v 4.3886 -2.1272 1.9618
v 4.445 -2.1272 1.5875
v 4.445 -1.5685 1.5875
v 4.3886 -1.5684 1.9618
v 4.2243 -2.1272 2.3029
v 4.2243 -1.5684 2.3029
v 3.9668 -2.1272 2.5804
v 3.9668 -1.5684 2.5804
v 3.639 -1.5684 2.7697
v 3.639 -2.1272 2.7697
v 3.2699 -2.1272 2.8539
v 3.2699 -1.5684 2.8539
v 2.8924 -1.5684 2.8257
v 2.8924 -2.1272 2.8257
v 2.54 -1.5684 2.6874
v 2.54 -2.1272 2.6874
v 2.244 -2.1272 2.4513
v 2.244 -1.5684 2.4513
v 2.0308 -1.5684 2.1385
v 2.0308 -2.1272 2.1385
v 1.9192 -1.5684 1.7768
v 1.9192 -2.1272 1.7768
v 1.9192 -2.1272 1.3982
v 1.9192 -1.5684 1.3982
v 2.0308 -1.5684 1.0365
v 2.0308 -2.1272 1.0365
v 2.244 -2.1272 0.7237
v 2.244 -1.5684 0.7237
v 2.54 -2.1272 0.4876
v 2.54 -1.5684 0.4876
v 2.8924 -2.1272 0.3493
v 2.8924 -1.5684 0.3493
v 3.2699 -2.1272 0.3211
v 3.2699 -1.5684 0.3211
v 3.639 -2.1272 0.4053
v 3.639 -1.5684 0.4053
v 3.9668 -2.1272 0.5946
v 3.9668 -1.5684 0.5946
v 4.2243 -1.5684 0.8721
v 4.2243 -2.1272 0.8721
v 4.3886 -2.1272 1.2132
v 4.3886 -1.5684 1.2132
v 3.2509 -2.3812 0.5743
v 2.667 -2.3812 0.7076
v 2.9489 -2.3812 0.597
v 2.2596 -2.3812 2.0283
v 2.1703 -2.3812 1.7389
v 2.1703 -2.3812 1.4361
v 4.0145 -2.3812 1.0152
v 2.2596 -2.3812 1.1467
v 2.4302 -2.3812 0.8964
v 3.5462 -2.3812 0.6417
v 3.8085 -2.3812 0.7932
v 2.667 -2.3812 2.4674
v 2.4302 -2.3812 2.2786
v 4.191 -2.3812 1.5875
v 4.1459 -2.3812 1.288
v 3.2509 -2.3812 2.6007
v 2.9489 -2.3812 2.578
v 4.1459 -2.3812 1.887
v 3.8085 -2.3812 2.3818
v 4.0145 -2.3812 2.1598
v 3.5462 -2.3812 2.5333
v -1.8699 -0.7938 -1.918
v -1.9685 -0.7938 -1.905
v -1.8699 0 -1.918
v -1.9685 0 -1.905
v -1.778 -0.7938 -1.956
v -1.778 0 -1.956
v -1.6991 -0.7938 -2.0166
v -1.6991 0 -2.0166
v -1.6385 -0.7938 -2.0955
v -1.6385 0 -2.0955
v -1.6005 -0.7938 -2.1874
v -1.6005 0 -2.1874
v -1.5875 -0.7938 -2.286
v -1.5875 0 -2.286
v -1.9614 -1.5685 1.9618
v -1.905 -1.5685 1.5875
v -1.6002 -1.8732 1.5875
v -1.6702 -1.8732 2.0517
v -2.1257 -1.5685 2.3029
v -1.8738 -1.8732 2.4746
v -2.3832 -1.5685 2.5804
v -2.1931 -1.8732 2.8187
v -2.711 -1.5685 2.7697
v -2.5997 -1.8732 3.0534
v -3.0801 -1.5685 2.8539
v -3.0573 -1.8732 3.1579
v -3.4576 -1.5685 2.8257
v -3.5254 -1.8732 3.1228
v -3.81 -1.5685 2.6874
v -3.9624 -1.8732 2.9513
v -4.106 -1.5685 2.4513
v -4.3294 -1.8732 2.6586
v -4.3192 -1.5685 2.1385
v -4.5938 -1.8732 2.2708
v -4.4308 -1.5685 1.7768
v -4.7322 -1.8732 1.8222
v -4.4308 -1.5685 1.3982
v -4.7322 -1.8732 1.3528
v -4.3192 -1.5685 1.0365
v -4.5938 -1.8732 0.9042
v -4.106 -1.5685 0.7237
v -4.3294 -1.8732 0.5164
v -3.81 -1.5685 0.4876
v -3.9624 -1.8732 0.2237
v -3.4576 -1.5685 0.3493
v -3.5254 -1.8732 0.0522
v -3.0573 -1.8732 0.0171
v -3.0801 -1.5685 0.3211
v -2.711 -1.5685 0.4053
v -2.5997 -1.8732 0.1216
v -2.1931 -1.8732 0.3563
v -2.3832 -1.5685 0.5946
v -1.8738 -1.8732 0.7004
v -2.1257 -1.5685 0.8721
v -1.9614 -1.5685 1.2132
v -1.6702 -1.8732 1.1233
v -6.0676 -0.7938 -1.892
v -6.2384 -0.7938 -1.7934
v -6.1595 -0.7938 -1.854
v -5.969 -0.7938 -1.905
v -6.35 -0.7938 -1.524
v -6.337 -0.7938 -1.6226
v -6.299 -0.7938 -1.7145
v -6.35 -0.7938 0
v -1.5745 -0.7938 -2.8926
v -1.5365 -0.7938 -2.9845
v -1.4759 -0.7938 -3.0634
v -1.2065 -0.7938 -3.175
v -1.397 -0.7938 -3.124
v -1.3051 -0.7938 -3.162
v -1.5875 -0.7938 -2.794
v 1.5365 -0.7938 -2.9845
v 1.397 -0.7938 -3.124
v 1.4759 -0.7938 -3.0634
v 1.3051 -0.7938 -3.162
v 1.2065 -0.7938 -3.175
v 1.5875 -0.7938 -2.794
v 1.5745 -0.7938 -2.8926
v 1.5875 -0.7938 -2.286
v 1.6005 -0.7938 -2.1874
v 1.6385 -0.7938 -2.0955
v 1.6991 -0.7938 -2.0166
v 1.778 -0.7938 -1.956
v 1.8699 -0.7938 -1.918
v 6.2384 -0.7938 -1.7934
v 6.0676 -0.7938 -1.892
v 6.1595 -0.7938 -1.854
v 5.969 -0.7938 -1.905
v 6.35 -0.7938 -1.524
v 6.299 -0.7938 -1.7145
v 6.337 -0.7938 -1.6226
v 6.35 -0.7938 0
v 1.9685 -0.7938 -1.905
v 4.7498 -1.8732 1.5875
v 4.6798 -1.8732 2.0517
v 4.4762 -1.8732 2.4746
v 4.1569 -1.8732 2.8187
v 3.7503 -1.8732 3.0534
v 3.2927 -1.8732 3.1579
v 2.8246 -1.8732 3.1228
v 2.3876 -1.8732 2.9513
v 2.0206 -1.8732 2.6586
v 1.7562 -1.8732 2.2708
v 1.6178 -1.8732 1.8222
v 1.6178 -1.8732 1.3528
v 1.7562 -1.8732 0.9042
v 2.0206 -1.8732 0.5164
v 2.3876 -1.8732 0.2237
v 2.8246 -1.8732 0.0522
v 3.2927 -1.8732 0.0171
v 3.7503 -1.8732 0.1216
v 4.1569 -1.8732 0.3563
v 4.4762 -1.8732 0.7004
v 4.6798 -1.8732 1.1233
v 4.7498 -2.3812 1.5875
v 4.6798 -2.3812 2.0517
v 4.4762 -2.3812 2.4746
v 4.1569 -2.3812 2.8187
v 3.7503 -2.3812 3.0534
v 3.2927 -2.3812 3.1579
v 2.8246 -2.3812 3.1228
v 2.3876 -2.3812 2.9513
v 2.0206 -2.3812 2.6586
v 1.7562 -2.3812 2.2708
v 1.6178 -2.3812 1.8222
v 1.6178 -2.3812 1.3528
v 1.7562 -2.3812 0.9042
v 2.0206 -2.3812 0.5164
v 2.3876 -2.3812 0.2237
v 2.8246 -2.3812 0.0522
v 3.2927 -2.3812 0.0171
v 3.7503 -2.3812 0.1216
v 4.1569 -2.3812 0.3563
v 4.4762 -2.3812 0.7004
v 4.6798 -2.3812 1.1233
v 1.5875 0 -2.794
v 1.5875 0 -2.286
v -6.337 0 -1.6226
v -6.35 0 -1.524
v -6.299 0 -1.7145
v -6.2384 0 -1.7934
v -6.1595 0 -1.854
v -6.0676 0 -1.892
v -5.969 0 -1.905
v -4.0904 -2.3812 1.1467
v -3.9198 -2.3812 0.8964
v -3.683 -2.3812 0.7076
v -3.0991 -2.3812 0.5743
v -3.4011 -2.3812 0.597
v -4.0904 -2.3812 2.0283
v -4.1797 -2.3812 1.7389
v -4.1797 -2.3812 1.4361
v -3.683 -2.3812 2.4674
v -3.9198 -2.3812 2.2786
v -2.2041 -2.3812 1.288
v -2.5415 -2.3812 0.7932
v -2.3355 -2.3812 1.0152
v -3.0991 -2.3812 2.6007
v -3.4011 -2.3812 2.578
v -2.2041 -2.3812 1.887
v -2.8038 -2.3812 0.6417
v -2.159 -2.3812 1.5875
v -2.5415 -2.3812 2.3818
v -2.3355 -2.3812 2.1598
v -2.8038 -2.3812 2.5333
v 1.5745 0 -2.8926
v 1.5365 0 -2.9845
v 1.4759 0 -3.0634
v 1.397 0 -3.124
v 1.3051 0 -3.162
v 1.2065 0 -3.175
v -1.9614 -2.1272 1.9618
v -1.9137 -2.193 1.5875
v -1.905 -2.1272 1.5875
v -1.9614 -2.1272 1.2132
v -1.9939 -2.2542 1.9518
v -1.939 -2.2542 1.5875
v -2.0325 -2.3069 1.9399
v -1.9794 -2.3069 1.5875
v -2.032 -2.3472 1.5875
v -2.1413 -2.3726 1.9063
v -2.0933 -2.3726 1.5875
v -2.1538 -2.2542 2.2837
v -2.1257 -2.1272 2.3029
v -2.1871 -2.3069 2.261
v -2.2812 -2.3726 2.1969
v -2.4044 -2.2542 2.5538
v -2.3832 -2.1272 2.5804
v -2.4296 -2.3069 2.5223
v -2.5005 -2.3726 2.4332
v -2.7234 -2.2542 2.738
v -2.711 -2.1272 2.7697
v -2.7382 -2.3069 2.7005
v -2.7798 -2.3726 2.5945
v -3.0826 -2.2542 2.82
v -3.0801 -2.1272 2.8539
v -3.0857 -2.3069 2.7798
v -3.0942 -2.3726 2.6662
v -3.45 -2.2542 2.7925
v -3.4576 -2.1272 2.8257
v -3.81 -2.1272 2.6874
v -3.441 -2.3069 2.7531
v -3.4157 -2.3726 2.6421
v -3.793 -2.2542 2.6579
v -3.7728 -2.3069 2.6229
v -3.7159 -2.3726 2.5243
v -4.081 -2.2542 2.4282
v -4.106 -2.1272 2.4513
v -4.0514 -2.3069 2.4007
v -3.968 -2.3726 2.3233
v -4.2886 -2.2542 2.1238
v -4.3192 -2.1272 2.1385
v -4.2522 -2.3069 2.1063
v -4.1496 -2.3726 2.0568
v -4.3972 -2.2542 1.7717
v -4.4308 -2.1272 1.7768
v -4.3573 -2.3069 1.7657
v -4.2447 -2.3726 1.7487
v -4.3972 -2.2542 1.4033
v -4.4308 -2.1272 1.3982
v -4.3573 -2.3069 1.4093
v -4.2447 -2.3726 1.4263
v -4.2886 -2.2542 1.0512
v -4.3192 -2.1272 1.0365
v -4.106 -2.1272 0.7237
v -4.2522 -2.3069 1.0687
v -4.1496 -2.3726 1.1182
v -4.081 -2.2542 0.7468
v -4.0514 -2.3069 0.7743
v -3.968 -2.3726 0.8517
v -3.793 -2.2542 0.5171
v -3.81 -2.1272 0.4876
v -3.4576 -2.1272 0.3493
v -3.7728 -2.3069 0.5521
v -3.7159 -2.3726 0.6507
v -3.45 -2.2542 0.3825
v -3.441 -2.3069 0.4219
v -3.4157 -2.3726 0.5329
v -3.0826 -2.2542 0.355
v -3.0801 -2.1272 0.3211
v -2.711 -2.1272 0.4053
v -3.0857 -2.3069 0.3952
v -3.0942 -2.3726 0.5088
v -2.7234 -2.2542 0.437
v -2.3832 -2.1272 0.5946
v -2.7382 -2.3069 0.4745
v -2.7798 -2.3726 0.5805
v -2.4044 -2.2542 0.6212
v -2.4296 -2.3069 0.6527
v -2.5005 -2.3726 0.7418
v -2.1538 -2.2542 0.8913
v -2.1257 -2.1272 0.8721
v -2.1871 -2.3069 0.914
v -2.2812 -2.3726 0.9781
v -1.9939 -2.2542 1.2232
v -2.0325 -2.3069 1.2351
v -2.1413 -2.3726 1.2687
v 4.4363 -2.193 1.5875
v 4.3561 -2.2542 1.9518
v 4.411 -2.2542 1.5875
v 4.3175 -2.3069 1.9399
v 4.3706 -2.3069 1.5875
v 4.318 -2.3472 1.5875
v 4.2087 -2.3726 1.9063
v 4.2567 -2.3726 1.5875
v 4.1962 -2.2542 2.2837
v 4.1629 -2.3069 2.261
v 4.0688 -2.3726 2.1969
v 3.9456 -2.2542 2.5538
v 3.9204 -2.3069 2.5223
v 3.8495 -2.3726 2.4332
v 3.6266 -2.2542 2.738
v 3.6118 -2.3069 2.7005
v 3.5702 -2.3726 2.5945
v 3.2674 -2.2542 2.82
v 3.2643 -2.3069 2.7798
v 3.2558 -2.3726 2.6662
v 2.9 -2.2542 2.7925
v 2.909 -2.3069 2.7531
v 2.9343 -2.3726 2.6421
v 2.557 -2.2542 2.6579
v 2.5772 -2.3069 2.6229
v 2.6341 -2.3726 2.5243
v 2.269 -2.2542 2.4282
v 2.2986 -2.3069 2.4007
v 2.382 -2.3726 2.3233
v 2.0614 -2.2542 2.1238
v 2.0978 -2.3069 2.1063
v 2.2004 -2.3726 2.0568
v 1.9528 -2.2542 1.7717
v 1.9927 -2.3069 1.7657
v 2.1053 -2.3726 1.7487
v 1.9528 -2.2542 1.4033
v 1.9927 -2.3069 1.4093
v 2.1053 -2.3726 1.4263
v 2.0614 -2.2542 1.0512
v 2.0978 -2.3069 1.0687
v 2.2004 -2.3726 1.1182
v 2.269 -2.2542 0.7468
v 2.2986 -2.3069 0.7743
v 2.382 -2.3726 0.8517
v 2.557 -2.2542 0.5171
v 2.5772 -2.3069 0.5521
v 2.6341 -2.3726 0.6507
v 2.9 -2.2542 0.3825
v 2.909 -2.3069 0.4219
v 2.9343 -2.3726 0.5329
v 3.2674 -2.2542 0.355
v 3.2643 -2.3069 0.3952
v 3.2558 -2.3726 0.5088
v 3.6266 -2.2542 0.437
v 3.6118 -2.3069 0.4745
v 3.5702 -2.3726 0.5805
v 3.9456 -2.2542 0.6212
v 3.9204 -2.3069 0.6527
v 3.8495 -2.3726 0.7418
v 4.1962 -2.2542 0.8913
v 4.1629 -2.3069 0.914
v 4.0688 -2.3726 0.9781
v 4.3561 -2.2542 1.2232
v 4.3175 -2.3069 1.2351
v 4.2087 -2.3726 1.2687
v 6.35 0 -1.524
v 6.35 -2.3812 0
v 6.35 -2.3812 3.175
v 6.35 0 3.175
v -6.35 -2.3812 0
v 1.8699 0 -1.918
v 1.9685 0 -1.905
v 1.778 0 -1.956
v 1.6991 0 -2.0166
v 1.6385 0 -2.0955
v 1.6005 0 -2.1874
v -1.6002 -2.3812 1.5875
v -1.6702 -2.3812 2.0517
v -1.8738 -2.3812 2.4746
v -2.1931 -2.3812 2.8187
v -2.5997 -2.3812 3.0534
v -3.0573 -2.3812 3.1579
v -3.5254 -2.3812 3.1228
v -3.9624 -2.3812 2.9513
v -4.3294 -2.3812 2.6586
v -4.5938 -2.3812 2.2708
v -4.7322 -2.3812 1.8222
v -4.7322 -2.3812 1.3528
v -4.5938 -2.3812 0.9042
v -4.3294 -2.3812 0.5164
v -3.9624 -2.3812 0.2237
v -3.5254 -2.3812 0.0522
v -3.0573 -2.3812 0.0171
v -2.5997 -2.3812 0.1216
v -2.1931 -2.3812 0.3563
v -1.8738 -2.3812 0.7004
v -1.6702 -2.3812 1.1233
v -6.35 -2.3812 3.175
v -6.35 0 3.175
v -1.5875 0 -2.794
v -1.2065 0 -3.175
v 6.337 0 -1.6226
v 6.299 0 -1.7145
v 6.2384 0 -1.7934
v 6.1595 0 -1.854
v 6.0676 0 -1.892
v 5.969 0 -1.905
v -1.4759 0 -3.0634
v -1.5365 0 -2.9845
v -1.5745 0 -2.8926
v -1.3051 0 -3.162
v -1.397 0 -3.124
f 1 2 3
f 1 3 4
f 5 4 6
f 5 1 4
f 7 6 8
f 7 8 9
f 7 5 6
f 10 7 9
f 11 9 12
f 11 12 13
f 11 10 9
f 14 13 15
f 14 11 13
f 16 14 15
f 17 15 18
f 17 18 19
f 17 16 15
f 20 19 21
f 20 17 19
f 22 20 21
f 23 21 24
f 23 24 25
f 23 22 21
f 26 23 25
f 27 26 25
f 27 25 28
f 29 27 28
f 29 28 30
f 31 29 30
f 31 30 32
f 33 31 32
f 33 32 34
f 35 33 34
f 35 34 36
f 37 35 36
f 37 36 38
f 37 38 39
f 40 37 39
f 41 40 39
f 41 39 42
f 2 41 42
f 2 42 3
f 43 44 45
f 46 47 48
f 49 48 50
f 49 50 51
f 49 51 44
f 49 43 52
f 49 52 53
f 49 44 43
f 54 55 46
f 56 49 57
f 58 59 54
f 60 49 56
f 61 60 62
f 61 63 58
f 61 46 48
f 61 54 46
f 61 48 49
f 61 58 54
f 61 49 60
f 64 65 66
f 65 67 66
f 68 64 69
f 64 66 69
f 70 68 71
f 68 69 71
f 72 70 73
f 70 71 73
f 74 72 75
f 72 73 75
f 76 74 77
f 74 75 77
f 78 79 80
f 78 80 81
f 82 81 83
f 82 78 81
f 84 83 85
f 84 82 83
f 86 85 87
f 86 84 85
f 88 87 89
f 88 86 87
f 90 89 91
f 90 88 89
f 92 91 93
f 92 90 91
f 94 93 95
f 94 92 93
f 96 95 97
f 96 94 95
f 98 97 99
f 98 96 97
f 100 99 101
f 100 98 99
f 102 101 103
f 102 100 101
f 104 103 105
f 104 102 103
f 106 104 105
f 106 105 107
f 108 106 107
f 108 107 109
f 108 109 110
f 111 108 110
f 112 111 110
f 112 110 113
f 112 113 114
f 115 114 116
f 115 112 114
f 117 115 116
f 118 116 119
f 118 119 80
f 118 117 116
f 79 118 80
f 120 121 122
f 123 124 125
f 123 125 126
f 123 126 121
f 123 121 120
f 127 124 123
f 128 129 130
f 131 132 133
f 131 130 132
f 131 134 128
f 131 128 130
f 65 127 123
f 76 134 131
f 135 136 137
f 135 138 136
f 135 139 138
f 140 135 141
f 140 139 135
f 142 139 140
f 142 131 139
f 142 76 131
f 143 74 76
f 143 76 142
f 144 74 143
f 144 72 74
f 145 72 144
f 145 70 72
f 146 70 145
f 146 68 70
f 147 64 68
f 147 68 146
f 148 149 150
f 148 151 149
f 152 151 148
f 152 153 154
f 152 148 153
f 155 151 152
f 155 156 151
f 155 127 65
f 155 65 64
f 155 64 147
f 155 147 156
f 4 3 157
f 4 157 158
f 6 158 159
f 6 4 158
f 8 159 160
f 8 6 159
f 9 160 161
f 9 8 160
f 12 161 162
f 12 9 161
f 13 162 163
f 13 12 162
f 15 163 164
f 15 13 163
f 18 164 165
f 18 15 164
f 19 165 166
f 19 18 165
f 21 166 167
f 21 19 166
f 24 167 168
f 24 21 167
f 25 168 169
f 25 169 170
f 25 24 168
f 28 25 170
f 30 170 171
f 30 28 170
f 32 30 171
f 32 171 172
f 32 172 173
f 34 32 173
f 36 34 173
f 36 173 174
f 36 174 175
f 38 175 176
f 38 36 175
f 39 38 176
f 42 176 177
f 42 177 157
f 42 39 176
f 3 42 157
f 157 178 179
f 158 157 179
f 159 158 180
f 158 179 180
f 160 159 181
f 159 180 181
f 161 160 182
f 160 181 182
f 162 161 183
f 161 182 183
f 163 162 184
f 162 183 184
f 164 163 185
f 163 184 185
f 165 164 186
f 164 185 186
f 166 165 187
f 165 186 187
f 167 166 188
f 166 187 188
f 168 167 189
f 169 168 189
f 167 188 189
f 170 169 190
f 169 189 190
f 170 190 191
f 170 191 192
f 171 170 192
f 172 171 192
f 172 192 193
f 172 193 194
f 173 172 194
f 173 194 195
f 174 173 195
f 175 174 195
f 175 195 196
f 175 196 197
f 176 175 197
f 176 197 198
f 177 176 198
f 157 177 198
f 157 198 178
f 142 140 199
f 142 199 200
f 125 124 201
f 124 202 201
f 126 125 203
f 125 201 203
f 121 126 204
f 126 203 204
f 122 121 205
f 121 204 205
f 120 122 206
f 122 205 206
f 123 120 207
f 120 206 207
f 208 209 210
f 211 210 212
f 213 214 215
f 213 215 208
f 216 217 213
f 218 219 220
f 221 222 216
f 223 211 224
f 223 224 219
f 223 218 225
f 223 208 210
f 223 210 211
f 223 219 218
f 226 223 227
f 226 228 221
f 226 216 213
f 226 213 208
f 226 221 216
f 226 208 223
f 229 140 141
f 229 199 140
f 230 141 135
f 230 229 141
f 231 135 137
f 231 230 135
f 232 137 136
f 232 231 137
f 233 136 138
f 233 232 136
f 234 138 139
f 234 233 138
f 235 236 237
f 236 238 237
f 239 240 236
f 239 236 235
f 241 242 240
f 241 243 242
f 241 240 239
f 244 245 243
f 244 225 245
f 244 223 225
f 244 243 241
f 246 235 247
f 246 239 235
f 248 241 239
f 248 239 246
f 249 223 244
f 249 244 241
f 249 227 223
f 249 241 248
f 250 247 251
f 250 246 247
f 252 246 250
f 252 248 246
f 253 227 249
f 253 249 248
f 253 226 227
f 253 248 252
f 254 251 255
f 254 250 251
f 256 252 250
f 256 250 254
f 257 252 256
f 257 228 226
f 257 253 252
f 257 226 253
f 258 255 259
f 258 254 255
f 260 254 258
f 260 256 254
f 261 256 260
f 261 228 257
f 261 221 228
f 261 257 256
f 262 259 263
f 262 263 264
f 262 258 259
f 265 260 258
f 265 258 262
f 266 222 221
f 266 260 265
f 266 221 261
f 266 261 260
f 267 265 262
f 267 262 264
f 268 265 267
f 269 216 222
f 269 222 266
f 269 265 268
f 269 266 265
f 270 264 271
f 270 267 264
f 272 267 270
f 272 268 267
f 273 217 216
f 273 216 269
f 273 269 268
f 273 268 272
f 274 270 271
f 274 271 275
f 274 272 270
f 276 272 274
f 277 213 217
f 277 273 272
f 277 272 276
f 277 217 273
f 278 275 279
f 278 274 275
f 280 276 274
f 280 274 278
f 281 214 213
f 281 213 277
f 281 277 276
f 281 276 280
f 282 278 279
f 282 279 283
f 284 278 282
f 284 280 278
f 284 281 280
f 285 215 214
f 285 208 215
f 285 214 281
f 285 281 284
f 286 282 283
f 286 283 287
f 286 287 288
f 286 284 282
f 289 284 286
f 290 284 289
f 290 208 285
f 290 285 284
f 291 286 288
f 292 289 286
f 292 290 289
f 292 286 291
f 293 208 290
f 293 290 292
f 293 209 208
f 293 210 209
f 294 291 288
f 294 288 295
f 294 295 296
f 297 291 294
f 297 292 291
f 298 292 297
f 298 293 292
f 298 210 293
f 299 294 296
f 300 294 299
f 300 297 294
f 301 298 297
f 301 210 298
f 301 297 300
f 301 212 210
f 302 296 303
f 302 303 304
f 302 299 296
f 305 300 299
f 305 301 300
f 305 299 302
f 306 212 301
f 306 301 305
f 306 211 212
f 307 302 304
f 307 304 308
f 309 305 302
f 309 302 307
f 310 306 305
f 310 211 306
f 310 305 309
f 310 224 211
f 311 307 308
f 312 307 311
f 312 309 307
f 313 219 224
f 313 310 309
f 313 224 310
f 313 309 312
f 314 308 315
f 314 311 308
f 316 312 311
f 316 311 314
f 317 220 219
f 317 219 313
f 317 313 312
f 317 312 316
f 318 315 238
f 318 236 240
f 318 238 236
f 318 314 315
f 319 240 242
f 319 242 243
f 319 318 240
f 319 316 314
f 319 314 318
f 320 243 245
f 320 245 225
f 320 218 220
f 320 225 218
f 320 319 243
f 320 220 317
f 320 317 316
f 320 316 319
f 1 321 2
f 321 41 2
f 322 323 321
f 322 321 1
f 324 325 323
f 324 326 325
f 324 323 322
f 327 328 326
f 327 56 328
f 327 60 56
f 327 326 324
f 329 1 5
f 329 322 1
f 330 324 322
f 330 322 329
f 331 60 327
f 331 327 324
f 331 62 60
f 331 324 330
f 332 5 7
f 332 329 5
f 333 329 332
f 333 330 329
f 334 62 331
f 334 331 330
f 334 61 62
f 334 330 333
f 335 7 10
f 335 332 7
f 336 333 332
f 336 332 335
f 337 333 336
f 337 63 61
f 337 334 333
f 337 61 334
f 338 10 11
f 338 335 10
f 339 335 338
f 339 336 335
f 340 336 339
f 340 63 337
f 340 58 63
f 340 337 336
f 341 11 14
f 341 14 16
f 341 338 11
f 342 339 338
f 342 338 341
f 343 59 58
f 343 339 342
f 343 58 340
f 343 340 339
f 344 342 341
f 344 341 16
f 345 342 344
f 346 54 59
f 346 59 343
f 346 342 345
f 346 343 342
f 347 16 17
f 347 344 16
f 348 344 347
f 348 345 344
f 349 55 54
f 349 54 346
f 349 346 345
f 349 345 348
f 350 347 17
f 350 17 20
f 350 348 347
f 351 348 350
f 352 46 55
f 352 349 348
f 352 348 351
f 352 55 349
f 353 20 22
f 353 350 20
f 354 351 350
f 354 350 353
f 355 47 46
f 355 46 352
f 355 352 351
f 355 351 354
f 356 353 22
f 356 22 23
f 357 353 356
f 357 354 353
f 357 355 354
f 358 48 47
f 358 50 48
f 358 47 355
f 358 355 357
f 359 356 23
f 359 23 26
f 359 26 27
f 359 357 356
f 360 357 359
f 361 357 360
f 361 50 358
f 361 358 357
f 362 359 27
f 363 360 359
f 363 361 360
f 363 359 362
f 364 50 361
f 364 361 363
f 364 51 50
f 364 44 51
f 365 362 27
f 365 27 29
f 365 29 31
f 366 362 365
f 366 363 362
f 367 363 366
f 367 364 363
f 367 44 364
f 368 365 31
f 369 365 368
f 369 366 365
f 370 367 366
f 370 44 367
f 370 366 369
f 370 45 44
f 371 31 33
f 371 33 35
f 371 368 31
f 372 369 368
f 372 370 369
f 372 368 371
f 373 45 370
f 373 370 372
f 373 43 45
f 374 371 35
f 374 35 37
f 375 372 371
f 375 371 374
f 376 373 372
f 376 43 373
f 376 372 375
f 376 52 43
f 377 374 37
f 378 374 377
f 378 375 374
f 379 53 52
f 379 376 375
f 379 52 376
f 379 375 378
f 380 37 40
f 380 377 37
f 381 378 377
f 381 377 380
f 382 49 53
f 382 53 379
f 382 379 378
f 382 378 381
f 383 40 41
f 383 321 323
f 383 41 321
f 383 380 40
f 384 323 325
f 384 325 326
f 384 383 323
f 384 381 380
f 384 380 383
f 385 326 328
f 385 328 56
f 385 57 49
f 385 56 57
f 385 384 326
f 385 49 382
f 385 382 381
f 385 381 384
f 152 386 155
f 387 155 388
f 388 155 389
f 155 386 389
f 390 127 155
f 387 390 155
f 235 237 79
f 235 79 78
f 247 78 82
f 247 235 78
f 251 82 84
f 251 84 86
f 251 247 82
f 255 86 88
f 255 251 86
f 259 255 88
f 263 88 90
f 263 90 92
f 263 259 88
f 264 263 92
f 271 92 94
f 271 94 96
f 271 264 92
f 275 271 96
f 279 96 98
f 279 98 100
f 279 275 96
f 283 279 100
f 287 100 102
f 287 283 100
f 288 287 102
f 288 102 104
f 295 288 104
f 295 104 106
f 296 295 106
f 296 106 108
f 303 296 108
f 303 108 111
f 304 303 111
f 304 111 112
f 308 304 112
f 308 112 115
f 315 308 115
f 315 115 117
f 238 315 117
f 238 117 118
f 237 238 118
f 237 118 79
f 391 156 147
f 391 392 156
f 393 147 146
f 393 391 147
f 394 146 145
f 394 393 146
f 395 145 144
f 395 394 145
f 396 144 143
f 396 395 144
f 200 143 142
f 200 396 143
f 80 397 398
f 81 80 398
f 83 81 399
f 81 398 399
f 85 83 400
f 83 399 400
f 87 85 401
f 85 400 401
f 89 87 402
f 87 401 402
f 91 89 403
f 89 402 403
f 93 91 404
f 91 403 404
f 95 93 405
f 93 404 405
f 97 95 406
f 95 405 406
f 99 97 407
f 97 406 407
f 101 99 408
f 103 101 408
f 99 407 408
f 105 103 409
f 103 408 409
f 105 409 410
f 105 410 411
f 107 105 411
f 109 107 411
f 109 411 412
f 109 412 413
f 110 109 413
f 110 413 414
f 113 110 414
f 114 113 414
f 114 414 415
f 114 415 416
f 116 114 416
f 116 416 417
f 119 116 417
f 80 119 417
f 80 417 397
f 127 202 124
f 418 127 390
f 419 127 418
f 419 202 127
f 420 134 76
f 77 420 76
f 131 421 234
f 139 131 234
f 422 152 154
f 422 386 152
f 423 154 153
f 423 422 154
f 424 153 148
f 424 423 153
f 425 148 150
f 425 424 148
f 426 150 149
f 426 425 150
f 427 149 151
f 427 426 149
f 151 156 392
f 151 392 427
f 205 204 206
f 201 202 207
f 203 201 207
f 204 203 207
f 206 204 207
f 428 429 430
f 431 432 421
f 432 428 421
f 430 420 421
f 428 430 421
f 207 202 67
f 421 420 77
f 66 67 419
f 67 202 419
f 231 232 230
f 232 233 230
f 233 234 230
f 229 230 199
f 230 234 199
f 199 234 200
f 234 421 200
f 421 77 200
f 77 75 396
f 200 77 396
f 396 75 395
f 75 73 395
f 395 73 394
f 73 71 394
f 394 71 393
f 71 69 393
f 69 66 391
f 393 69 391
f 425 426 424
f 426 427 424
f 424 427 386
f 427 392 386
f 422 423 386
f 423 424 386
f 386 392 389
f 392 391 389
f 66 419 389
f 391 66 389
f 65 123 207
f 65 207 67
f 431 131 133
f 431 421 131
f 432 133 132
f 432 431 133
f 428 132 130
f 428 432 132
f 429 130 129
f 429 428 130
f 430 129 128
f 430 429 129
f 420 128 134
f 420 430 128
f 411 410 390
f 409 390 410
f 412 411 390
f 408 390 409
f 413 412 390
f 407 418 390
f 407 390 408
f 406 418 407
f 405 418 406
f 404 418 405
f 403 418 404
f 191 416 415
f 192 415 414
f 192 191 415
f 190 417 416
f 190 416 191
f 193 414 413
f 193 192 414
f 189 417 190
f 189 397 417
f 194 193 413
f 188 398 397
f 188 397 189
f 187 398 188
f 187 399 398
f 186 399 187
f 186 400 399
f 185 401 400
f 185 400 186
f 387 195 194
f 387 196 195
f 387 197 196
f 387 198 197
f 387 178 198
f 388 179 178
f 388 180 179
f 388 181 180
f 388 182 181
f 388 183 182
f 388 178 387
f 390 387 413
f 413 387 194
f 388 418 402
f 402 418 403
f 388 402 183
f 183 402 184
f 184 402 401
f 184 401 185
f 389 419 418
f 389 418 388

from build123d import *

# Parameters (mm, degrees)
F0_W     = 12.7
F0_H     = 6.35
F1_DEPTH = 0.79375
F2_W     = 4.7625
F2_H     = 1.27
F3_DEPTH = 25.4
F4_R     = 0.381
F2_W_2   = 12.7
F2_H_2   = 3.175
F5_DEPTH = 1.5875
F6_R     = 1.5748
F6_R_2   = 1.27
F7_DEPTH = 0.889
F9_R     = 0.254


# Not quite as in the source:
# - a fillet or chamfer that OpenCascade refuses, or shapes differently, is made with other operations: its cross-section is extruded or revolved along the edge and cut away or added


with BuildPart() as f1:
    # F0 (on Front) → F1 (new body)
    with BuildSketch(Plane.XZ):
        Rectangle(F0_W, F0_H)
    extrude(amount=F1_DEPTH)

    # F2 (on face) → F3 (cut)
    with BuildSketch(Plane.XZ.offset(0.79375)):
        with Locations((-3.96875, -2.54)):
            Rectangle(F2_W, F2_H)
        with Locations((3.96875, -2.54)):
            Rectangle(F2_W, F2_H)
    extrude(amount=-F3_DEPTH, mode=Mode.SUBTRACT)

    # F4
    f4_edges = [f1.edges().sort_by_distance(p)[0] for p in [
        (-1.5875, -0.396875, -3.175),
        (1.5875, -0.396875, -3.175),
        (-6.35, -0.396875, -1.905),
        (6.35, -0.396875, -1.905),
        (1.5875, -0.396875, -1.905),
        (-1.5875, -0.396875, -1.905),
    ]]
    fillet(f4_edges, radius=F4_R)

    # F2 (on face) → F5 (join)
    with BuildSketch(Plane.XZ.offset(0.79375)):
        with Locations((0, 1.5875)):
            Rectangle(F2_W_2, F2_H_2)
    extrude(amount=F5_DEPTH)

    # F6 (on face) → F7 (cut)
    with BuildSketch(Plane.XZ.offset(2.38125)):
        with Locations((-3.175, 1.5875)):
            Circle(F6_R)
        with Locations((-3.175, 1.5875)):
            Circle(F6_R_2, mode=Mode.SUBTRACT)
        with Locations((3.175, 1.5875)):
            Circle(F6_R)
        with Locations((3.175, 1.5875)):
            Circle(F6_R_2, mode=Mode.SUBTRACT)
    extrude(amount=-F7_DEPTH, mode=Mode.SUBTRACT)

    # F8: chamfer of 0.381 on 2 edges, made by hand

    # F8_s1 → F8_t2 (revolve)
    with BuildSketch(Plane.XY.offset(1.5875)):
        Polygon((-1.6002, -1.87325), (-1.9812, -1.49225), (-1.6002, -1.49225), align=None)
    revolve(axis=Axis((-3.175, -1.49225, 1.5875), (0, -1, 0)))

    # F8_s3 → F8_t4 (revolve)
    with BuildSketch(Plane.XY.offset(1.5875)):
        Polygon((4.7498, -1.87325), (4.3688, -1.49225), (4.7498, -1.49225), align=None)
    revolve(axis=Axis((3.175, -1.49225, 1.5875), (0, -1, 0)))

    # F9
    f9_edges = [f1.edges().sort_by_distance(p)[0] for p in [
        (-4.445, -2.38125, 1.5875),
        (1.905, -2.38125, 1.5875),
    ]]
    fillet(f9_edges, radius=F9_R)


solid = f1.part
